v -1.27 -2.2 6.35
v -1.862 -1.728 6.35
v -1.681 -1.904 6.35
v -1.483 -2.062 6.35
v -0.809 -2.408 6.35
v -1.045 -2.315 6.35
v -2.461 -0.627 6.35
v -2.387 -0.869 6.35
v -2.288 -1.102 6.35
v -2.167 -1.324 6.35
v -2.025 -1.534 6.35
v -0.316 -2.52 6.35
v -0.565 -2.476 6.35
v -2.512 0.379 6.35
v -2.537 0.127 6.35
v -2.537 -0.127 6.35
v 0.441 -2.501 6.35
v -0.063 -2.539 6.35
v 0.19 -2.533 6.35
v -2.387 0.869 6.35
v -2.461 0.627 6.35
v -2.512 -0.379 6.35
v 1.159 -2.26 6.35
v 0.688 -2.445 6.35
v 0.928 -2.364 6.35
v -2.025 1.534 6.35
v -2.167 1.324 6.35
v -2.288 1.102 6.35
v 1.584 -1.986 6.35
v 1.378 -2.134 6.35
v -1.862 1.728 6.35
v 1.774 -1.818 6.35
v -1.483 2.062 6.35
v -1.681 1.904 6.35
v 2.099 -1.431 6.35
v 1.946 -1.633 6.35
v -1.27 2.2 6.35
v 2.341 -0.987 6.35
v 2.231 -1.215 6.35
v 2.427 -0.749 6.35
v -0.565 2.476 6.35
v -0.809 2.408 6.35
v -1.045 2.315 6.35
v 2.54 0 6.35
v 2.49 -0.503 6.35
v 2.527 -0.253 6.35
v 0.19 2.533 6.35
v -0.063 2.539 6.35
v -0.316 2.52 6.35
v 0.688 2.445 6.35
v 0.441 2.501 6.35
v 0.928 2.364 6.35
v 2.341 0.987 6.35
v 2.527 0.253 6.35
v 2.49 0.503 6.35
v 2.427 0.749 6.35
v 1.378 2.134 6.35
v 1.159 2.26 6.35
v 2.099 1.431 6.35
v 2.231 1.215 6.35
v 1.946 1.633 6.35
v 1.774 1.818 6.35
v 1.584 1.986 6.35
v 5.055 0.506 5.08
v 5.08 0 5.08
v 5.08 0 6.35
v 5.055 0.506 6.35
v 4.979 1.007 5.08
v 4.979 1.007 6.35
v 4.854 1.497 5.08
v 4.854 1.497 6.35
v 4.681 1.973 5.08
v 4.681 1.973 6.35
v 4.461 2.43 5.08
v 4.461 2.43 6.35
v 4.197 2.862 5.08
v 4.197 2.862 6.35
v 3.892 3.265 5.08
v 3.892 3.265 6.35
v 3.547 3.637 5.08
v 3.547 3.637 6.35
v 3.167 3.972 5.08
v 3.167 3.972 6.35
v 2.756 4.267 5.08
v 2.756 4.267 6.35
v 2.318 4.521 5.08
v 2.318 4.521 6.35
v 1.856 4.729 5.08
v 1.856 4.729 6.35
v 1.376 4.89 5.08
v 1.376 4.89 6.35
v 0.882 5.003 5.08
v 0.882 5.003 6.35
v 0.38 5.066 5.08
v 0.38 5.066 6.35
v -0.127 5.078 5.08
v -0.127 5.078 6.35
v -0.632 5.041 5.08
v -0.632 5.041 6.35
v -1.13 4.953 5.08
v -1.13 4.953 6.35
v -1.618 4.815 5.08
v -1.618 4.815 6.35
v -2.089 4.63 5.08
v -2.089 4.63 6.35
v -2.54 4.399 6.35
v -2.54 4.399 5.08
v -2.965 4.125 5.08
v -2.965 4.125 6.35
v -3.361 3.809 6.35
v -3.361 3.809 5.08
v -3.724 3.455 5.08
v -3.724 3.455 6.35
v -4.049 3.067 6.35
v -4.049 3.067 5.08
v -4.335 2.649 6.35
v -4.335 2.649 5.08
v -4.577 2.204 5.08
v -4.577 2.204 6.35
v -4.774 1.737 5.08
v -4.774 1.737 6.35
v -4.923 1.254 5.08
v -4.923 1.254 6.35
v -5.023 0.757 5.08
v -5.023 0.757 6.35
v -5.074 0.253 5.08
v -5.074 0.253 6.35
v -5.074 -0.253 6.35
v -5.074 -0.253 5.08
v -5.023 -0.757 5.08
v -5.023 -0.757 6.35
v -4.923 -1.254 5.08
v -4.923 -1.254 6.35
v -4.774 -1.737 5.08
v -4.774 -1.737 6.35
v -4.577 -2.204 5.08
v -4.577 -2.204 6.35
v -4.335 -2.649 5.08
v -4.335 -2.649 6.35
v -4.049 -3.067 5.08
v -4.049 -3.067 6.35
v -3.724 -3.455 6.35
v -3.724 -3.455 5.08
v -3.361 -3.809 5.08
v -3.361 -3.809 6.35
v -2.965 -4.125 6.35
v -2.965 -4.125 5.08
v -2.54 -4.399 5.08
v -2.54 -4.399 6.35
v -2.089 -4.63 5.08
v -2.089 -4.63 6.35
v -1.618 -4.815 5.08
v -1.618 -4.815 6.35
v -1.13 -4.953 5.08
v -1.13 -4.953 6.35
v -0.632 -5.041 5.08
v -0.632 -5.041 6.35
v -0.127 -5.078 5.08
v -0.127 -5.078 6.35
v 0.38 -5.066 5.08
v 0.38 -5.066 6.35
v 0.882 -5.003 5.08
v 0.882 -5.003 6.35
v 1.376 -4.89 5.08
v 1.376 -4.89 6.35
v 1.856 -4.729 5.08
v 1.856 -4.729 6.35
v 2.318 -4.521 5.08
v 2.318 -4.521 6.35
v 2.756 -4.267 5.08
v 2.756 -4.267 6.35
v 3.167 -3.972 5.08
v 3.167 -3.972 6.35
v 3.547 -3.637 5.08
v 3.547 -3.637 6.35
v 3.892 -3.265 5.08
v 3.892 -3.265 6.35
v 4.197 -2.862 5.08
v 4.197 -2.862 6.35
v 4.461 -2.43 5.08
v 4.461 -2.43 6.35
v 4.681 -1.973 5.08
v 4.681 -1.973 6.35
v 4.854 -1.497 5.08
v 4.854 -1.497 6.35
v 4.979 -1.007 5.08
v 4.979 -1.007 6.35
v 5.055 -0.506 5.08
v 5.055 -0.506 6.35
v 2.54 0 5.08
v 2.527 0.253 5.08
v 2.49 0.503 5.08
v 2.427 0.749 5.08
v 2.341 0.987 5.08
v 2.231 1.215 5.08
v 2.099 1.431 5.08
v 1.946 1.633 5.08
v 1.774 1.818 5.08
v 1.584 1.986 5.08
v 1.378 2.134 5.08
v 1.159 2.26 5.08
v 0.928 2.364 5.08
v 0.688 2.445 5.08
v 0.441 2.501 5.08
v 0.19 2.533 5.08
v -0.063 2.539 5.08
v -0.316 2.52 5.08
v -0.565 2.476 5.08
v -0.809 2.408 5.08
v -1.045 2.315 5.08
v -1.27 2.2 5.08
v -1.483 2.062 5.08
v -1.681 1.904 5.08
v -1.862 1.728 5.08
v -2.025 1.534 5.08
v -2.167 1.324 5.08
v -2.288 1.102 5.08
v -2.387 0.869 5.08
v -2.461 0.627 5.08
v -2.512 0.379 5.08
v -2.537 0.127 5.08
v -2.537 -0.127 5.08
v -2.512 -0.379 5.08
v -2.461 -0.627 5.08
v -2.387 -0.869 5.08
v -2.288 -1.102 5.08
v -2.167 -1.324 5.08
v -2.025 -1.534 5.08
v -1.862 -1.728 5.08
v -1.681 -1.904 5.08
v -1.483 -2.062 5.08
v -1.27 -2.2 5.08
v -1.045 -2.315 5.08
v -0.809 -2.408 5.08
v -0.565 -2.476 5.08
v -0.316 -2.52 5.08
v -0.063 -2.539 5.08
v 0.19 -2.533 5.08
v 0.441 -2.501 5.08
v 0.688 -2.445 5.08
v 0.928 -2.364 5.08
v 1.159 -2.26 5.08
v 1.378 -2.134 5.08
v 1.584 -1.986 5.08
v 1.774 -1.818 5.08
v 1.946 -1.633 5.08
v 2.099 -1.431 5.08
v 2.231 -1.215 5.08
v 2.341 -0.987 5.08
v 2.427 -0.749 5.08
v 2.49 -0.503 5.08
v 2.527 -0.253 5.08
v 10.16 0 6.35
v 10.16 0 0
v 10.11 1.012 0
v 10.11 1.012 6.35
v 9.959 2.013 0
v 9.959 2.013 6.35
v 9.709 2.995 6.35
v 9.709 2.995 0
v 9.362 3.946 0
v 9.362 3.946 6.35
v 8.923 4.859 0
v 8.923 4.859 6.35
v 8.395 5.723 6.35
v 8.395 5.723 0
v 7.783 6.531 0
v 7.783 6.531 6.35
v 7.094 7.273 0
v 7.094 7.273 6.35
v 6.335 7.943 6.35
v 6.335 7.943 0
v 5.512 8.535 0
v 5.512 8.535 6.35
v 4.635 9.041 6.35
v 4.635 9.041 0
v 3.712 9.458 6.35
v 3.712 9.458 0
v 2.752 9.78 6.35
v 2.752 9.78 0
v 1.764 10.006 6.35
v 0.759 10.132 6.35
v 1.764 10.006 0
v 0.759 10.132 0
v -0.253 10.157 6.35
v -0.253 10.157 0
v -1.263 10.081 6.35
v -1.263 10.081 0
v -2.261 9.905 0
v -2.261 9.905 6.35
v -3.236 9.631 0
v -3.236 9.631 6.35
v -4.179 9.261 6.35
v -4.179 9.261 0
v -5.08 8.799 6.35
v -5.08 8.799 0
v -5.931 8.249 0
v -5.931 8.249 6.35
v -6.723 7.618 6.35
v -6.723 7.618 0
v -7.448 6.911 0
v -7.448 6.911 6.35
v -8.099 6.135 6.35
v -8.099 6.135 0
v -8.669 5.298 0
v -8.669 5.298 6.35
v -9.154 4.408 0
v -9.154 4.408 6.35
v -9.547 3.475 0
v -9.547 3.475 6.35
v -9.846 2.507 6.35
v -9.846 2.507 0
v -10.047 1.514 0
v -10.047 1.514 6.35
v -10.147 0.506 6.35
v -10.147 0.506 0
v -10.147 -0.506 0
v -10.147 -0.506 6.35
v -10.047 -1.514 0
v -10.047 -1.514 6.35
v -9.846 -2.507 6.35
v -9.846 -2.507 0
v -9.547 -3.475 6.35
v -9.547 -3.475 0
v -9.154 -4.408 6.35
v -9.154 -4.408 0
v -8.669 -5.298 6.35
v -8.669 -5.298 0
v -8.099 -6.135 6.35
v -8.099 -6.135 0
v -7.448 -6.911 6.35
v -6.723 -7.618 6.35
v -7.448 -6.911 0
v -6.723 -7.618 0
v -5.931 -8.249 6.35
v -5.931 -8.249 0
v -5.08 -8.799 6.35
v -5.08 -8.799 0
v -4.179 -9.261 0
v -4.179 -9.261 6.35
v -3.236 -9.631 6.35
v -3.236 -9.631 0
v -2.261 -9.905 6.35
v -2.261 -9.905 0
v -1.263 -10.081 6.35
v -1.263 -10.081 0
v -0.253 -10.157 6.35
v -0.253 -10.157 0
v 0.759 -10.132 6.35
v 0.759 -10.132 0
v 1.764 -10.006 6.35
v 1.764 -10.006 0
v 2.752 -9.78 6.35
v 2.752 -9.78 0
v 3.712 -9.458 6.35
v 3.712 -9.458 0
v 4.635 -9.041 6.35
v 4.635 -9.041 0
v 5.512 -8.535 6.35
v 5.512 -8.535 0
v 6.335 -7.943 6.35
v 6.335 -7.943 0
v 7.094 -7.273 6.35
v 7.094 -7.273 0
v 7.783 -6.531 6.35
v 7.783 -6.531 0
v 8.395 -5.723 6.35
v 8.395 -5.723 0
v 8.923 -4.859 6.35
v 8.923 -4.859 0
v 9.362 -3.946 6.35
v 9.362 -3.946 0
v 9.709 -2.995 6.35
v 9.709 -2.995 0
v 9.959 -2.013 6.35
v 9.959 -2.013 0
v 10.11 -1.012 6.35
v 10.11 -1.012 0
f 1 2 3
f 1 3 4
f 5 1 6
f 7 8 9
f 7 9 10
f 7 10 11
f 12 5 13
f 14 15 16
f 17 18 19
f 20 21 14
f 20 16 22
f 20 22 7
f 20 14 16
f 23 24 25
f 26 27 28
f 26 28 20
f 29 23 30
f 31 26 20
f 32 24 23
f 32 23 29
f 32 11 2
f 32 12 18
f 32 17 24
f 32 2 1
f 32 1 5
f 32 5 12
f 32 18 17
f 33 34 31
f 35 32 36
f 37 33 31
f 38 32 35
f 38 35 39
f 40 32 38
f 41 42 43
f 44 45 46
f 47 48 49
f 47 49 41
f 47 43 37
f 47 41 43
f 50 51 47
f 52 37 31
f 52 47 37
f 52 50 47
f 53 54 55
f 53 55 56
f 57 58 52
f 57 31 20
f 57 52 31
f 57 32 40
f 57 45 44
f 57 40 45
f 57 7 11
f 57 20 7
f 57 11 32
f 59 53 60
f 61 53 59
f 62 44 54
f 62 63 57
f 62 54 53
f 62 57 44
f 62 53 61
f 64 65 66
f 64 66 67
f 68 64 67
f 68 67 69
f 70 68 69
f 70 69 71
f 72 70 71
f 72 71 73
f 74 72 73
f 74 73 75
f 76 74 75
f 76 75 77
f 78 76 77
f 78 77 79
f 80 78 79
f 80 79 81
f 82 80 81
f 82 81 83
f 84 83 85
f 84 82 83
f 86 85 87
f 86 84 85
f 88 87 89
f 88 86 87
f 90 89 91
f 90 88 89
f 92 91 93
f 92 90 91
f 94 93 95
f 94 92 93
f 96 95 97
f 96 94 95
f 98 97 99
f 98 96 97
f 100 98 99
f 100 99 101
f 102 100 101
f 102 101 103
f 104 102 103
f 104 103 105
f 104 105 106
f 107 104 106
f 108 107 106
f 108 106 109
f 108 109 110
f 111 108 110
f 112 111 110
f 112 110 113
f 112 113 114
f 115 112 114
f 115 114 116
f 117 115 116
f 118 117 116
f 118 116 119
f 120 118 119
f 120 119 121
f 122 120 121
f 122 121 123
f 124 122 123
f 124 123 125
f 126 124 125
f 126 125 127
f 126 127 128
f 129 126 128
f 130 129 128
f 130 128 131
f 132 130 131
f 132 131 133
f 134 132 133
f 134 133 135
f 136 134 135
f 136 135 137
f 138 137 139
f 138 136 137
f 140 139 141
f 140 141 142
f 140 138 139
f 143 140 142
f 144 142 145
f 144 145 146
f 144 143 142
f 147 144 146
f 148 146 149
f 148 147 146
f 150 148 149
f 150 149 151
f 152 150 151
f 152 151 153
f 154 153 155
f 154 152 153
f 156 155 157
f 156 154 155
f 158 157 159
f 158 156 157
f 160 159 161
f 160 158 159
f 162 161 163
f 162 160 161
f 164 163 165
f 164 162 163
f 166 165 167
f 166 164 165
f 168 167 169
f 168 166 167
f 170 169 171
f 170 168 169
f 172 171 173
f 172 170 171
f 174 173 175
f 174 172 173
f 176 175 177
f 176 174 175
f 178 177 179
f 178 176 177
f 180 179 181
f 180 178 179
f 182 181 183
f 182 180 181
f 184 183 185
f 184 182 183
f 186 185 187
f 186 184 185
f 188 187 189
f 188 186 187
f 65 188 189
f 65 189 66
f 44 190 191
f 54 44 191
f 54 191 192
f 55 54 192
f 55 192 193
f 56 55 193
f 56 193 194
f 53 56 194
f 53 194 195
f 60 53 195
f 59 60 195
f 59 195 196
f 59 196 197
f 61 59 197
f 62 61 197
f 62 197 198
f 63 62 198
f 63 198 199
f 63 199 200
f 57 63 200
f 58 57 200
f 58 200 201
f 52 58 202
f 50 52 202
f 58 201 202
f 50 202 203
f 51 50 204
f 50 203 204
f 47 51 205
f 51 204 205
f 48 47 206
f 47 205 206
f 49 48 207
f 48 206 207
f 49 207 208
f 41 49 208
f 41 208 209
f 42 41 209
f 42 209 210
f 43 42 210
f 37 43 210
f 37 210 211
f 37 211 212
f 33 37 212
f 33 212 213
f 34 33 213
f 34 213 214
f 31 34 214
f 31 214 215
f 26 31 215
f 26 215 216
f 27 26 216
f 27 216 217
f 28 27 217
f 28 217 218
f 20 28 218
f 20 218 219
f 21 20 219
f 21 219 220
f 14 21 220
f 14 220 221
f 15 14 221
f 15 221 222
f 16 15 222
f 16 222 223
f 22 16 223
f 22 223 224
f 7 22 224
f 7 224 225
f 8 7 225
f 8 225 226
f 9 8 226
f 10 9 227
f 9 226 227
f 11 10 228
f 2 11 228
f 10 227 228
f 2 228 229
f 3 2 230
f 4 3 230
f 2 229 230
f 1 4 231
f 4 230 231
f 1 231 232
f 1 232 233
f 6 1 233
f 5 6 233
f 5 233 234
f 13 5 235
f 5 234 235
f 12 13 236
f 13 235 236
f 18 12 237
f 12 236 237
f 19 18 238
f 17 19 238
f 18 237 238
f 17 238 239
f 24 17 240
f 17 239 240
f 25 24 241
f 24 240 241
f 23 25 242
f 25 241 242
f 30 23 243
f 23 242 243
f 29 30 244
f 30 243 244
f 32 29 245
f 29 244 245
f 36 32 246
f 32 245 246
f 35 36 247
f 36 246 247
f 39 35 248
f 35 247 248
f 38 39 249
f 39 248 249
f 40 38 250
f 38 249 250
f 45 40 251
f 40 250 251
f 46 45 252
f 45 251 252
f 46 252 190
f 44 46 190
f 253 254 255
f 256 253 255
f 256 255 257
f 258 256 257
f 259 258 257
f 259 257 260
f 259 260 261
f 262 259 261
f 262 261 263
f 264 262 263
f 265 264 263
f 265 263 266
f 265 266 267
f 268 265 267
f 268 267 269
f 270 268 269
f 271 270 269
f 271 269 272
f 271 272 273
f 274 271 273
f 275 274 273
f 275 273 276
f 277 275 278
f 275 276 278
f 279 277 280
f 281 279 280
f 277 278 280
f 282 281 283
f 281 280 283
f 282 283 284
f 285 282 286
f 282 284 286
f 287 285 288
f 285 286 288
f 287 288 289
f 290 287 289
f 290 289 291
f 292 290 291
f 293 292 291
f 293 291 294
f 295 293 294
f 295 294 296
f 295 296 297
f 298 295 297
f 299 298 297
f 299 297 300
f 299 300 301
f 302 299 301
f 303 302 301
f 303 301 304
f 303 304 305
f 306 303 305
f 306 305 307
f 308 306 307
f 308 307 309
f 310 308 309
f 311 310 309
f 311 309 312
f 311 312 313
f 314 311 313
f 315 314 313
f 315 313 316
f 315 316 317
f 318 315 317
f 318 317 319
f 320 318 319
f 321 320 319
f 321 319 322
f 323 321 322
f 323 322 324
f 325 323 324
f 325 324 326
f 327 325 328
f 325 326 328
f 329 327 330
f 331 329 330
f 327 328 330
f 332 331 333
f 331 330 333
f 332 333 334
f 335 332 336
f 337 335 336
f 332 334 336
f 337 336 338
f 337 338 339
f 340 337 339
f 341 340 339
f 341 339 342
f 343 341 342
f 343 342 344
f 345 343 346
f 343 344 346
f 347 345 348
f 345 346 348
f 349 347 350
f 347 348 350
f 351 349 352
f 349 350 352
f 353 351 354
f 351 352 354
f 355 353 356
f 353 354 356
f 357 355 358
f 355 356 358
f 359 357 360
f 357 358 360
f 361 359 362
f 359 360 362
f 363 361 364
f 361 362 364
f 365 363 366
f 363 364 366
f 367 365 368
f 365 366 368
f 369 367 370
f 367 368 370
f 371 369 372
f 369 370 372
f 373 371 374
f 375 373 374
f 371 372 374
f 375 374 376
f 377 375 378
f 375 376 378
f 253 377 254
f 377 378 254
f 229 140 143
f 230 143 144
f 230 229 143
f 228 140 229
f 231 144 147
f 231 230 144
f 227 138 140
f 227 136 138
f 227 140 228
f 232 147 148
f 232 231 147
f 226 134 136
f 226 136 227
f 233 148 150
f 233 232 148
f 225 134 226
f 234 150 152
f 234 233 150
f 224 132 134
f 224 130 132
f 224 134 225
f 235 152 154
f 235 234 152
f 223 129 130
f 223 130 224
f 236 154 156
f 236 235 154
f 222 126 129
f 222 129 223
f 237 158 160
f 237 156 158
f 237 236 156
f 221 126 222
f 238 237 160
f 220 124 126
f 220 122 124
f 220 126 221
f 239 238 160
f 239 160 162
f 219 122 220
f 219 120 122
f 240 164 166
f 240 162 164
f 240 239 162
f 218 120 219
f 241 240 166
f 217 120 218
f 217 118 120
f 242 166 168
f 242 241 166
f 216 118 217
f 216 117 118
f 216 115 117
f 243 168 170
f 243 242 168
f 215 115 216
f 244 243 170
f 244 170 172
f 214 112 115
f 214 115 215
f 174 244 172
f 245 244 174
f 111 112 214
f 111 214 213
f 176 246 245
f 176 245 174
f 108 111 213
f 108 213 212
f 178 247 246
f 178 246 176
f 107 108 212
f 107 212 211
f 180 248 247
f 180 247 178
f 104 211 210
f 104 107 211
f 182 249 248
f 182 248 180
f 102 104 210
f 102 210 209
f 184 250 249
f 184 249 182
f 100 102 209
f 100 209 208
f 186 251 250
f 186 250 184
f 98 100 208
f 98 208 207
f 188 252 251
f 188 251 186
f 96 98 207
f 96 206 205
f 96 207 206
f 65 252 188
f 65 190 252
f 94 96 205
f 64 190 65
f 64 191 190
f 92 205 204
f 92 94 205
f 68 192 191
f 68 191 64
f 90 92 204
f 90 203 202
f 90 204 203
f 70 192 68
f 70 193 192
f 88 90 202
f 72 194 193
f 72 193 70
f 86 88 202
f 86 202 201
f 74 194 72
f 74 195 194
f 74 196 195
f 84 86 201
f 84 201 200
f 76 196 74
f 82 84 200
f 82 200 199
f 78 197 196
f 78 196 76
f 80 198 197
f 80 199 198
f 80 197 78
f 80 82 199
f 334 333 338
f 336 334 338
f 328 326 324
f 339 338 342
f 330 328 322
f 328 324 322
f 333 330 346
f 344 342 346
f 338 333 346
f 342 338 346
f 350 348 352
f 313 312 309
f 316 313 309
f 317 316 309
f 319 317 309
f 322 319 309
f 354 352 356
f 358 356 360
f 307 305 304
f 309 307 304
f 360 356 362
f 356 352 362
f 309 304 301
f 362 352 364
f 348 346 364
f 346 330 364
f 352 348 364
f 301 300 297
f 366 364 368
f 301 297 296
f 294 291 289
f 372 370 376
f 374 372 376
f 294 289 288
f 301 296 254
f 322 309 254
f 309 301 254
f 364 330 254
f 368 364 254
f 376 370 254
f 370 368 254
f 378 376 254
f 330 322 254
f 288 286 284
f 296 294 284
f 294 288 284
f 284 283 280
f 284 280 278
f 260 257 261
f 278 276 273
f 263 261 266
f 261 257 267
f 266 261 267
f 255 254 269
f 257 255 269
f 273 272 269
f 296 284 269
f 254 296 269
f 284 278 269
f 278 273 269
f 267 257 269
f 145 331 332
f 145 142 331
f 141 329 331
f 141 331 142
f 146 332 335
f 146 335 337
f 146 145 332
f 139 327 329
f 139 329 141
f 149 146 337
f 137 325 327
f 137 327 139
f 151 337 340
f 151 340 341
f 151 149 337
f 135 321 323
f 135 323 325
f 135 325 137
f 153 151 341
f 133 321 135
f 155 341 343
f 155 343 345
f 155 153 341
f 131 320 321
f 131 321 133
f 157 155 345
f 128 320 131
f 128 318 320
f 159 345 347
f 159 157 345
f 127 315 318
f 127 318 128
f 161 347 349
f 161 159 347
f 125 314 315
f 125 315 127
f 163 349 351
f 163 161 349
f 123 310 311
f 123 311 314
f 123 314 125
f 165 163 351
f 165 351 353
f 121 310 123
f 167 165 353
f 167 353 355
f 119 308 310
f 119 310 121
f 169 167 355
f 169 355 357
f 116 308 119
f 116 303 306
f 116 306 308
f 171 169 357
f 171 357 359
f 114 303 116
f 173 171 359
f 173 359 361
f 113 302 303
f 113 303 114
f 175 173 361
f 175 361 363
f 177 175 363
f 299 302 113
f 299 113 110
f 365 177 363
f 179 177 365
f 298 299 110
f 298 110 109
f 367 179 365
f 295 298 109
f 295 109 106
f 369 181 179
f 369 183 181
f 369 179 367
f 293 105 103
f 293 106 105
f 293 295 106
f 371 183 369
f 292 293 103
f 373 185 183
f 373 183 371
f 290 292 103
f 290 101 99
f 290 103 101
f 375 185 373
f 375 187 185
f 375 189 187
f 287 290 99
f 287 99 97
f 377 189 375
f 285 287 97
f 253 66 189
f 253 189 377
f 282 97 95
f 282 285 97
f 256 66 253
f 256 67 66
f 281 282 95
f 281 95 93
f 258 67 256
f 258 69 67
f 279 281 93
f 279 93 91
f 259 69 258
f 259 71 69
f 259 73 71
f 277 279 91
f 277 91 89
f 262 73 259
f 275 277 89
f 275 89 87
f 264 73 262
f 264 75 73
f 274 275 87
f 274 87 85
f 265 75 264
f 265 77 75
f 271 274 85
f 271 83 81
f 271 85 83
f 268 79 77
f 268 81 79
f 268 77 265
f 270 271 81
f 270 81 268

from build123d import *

# Parameters (mm, degrees)
F0_R     = 10.16
F0_R_2   = 5.08
F1_DEPTH = 6.35
F0_R_3   = 2.54
F2_DEPTH = 5.08


with BuildPart() as f1:
    # F0 (on Top) → F1 (new body)
    with BuildSketch(Plane.XY):
        Circle(F0_R)
        Circle(F0_R_2, mode=Mode.SUBTRACT)
    extrude(amount=F1_DEPTH)



with BuildPart() as f1b:
    # F0 (on Top) → F1, piece 2 (new body)
    with BuildSketch(Plane.XY):
        Circle(F0_R_3)
    extrude(amount=F1_DEPTH)


with BuildPart() as f1_1:
    add(f1.part)

    add(f1b.part)  # F2 merges F1b
    # F0 (on Top) → F2 (join)
    with BuildSketch(Plane.XY):
        Circle(F0_R)
        Circle(F0_R_2, mode=Mode.SUBTRACT)
        Circle(F0_R_2)
        Circle(F0_R_3, mode=Mode.SUBTRACT)
    extrude(amount=F2_DEPTH)


solid = f1_1.part
